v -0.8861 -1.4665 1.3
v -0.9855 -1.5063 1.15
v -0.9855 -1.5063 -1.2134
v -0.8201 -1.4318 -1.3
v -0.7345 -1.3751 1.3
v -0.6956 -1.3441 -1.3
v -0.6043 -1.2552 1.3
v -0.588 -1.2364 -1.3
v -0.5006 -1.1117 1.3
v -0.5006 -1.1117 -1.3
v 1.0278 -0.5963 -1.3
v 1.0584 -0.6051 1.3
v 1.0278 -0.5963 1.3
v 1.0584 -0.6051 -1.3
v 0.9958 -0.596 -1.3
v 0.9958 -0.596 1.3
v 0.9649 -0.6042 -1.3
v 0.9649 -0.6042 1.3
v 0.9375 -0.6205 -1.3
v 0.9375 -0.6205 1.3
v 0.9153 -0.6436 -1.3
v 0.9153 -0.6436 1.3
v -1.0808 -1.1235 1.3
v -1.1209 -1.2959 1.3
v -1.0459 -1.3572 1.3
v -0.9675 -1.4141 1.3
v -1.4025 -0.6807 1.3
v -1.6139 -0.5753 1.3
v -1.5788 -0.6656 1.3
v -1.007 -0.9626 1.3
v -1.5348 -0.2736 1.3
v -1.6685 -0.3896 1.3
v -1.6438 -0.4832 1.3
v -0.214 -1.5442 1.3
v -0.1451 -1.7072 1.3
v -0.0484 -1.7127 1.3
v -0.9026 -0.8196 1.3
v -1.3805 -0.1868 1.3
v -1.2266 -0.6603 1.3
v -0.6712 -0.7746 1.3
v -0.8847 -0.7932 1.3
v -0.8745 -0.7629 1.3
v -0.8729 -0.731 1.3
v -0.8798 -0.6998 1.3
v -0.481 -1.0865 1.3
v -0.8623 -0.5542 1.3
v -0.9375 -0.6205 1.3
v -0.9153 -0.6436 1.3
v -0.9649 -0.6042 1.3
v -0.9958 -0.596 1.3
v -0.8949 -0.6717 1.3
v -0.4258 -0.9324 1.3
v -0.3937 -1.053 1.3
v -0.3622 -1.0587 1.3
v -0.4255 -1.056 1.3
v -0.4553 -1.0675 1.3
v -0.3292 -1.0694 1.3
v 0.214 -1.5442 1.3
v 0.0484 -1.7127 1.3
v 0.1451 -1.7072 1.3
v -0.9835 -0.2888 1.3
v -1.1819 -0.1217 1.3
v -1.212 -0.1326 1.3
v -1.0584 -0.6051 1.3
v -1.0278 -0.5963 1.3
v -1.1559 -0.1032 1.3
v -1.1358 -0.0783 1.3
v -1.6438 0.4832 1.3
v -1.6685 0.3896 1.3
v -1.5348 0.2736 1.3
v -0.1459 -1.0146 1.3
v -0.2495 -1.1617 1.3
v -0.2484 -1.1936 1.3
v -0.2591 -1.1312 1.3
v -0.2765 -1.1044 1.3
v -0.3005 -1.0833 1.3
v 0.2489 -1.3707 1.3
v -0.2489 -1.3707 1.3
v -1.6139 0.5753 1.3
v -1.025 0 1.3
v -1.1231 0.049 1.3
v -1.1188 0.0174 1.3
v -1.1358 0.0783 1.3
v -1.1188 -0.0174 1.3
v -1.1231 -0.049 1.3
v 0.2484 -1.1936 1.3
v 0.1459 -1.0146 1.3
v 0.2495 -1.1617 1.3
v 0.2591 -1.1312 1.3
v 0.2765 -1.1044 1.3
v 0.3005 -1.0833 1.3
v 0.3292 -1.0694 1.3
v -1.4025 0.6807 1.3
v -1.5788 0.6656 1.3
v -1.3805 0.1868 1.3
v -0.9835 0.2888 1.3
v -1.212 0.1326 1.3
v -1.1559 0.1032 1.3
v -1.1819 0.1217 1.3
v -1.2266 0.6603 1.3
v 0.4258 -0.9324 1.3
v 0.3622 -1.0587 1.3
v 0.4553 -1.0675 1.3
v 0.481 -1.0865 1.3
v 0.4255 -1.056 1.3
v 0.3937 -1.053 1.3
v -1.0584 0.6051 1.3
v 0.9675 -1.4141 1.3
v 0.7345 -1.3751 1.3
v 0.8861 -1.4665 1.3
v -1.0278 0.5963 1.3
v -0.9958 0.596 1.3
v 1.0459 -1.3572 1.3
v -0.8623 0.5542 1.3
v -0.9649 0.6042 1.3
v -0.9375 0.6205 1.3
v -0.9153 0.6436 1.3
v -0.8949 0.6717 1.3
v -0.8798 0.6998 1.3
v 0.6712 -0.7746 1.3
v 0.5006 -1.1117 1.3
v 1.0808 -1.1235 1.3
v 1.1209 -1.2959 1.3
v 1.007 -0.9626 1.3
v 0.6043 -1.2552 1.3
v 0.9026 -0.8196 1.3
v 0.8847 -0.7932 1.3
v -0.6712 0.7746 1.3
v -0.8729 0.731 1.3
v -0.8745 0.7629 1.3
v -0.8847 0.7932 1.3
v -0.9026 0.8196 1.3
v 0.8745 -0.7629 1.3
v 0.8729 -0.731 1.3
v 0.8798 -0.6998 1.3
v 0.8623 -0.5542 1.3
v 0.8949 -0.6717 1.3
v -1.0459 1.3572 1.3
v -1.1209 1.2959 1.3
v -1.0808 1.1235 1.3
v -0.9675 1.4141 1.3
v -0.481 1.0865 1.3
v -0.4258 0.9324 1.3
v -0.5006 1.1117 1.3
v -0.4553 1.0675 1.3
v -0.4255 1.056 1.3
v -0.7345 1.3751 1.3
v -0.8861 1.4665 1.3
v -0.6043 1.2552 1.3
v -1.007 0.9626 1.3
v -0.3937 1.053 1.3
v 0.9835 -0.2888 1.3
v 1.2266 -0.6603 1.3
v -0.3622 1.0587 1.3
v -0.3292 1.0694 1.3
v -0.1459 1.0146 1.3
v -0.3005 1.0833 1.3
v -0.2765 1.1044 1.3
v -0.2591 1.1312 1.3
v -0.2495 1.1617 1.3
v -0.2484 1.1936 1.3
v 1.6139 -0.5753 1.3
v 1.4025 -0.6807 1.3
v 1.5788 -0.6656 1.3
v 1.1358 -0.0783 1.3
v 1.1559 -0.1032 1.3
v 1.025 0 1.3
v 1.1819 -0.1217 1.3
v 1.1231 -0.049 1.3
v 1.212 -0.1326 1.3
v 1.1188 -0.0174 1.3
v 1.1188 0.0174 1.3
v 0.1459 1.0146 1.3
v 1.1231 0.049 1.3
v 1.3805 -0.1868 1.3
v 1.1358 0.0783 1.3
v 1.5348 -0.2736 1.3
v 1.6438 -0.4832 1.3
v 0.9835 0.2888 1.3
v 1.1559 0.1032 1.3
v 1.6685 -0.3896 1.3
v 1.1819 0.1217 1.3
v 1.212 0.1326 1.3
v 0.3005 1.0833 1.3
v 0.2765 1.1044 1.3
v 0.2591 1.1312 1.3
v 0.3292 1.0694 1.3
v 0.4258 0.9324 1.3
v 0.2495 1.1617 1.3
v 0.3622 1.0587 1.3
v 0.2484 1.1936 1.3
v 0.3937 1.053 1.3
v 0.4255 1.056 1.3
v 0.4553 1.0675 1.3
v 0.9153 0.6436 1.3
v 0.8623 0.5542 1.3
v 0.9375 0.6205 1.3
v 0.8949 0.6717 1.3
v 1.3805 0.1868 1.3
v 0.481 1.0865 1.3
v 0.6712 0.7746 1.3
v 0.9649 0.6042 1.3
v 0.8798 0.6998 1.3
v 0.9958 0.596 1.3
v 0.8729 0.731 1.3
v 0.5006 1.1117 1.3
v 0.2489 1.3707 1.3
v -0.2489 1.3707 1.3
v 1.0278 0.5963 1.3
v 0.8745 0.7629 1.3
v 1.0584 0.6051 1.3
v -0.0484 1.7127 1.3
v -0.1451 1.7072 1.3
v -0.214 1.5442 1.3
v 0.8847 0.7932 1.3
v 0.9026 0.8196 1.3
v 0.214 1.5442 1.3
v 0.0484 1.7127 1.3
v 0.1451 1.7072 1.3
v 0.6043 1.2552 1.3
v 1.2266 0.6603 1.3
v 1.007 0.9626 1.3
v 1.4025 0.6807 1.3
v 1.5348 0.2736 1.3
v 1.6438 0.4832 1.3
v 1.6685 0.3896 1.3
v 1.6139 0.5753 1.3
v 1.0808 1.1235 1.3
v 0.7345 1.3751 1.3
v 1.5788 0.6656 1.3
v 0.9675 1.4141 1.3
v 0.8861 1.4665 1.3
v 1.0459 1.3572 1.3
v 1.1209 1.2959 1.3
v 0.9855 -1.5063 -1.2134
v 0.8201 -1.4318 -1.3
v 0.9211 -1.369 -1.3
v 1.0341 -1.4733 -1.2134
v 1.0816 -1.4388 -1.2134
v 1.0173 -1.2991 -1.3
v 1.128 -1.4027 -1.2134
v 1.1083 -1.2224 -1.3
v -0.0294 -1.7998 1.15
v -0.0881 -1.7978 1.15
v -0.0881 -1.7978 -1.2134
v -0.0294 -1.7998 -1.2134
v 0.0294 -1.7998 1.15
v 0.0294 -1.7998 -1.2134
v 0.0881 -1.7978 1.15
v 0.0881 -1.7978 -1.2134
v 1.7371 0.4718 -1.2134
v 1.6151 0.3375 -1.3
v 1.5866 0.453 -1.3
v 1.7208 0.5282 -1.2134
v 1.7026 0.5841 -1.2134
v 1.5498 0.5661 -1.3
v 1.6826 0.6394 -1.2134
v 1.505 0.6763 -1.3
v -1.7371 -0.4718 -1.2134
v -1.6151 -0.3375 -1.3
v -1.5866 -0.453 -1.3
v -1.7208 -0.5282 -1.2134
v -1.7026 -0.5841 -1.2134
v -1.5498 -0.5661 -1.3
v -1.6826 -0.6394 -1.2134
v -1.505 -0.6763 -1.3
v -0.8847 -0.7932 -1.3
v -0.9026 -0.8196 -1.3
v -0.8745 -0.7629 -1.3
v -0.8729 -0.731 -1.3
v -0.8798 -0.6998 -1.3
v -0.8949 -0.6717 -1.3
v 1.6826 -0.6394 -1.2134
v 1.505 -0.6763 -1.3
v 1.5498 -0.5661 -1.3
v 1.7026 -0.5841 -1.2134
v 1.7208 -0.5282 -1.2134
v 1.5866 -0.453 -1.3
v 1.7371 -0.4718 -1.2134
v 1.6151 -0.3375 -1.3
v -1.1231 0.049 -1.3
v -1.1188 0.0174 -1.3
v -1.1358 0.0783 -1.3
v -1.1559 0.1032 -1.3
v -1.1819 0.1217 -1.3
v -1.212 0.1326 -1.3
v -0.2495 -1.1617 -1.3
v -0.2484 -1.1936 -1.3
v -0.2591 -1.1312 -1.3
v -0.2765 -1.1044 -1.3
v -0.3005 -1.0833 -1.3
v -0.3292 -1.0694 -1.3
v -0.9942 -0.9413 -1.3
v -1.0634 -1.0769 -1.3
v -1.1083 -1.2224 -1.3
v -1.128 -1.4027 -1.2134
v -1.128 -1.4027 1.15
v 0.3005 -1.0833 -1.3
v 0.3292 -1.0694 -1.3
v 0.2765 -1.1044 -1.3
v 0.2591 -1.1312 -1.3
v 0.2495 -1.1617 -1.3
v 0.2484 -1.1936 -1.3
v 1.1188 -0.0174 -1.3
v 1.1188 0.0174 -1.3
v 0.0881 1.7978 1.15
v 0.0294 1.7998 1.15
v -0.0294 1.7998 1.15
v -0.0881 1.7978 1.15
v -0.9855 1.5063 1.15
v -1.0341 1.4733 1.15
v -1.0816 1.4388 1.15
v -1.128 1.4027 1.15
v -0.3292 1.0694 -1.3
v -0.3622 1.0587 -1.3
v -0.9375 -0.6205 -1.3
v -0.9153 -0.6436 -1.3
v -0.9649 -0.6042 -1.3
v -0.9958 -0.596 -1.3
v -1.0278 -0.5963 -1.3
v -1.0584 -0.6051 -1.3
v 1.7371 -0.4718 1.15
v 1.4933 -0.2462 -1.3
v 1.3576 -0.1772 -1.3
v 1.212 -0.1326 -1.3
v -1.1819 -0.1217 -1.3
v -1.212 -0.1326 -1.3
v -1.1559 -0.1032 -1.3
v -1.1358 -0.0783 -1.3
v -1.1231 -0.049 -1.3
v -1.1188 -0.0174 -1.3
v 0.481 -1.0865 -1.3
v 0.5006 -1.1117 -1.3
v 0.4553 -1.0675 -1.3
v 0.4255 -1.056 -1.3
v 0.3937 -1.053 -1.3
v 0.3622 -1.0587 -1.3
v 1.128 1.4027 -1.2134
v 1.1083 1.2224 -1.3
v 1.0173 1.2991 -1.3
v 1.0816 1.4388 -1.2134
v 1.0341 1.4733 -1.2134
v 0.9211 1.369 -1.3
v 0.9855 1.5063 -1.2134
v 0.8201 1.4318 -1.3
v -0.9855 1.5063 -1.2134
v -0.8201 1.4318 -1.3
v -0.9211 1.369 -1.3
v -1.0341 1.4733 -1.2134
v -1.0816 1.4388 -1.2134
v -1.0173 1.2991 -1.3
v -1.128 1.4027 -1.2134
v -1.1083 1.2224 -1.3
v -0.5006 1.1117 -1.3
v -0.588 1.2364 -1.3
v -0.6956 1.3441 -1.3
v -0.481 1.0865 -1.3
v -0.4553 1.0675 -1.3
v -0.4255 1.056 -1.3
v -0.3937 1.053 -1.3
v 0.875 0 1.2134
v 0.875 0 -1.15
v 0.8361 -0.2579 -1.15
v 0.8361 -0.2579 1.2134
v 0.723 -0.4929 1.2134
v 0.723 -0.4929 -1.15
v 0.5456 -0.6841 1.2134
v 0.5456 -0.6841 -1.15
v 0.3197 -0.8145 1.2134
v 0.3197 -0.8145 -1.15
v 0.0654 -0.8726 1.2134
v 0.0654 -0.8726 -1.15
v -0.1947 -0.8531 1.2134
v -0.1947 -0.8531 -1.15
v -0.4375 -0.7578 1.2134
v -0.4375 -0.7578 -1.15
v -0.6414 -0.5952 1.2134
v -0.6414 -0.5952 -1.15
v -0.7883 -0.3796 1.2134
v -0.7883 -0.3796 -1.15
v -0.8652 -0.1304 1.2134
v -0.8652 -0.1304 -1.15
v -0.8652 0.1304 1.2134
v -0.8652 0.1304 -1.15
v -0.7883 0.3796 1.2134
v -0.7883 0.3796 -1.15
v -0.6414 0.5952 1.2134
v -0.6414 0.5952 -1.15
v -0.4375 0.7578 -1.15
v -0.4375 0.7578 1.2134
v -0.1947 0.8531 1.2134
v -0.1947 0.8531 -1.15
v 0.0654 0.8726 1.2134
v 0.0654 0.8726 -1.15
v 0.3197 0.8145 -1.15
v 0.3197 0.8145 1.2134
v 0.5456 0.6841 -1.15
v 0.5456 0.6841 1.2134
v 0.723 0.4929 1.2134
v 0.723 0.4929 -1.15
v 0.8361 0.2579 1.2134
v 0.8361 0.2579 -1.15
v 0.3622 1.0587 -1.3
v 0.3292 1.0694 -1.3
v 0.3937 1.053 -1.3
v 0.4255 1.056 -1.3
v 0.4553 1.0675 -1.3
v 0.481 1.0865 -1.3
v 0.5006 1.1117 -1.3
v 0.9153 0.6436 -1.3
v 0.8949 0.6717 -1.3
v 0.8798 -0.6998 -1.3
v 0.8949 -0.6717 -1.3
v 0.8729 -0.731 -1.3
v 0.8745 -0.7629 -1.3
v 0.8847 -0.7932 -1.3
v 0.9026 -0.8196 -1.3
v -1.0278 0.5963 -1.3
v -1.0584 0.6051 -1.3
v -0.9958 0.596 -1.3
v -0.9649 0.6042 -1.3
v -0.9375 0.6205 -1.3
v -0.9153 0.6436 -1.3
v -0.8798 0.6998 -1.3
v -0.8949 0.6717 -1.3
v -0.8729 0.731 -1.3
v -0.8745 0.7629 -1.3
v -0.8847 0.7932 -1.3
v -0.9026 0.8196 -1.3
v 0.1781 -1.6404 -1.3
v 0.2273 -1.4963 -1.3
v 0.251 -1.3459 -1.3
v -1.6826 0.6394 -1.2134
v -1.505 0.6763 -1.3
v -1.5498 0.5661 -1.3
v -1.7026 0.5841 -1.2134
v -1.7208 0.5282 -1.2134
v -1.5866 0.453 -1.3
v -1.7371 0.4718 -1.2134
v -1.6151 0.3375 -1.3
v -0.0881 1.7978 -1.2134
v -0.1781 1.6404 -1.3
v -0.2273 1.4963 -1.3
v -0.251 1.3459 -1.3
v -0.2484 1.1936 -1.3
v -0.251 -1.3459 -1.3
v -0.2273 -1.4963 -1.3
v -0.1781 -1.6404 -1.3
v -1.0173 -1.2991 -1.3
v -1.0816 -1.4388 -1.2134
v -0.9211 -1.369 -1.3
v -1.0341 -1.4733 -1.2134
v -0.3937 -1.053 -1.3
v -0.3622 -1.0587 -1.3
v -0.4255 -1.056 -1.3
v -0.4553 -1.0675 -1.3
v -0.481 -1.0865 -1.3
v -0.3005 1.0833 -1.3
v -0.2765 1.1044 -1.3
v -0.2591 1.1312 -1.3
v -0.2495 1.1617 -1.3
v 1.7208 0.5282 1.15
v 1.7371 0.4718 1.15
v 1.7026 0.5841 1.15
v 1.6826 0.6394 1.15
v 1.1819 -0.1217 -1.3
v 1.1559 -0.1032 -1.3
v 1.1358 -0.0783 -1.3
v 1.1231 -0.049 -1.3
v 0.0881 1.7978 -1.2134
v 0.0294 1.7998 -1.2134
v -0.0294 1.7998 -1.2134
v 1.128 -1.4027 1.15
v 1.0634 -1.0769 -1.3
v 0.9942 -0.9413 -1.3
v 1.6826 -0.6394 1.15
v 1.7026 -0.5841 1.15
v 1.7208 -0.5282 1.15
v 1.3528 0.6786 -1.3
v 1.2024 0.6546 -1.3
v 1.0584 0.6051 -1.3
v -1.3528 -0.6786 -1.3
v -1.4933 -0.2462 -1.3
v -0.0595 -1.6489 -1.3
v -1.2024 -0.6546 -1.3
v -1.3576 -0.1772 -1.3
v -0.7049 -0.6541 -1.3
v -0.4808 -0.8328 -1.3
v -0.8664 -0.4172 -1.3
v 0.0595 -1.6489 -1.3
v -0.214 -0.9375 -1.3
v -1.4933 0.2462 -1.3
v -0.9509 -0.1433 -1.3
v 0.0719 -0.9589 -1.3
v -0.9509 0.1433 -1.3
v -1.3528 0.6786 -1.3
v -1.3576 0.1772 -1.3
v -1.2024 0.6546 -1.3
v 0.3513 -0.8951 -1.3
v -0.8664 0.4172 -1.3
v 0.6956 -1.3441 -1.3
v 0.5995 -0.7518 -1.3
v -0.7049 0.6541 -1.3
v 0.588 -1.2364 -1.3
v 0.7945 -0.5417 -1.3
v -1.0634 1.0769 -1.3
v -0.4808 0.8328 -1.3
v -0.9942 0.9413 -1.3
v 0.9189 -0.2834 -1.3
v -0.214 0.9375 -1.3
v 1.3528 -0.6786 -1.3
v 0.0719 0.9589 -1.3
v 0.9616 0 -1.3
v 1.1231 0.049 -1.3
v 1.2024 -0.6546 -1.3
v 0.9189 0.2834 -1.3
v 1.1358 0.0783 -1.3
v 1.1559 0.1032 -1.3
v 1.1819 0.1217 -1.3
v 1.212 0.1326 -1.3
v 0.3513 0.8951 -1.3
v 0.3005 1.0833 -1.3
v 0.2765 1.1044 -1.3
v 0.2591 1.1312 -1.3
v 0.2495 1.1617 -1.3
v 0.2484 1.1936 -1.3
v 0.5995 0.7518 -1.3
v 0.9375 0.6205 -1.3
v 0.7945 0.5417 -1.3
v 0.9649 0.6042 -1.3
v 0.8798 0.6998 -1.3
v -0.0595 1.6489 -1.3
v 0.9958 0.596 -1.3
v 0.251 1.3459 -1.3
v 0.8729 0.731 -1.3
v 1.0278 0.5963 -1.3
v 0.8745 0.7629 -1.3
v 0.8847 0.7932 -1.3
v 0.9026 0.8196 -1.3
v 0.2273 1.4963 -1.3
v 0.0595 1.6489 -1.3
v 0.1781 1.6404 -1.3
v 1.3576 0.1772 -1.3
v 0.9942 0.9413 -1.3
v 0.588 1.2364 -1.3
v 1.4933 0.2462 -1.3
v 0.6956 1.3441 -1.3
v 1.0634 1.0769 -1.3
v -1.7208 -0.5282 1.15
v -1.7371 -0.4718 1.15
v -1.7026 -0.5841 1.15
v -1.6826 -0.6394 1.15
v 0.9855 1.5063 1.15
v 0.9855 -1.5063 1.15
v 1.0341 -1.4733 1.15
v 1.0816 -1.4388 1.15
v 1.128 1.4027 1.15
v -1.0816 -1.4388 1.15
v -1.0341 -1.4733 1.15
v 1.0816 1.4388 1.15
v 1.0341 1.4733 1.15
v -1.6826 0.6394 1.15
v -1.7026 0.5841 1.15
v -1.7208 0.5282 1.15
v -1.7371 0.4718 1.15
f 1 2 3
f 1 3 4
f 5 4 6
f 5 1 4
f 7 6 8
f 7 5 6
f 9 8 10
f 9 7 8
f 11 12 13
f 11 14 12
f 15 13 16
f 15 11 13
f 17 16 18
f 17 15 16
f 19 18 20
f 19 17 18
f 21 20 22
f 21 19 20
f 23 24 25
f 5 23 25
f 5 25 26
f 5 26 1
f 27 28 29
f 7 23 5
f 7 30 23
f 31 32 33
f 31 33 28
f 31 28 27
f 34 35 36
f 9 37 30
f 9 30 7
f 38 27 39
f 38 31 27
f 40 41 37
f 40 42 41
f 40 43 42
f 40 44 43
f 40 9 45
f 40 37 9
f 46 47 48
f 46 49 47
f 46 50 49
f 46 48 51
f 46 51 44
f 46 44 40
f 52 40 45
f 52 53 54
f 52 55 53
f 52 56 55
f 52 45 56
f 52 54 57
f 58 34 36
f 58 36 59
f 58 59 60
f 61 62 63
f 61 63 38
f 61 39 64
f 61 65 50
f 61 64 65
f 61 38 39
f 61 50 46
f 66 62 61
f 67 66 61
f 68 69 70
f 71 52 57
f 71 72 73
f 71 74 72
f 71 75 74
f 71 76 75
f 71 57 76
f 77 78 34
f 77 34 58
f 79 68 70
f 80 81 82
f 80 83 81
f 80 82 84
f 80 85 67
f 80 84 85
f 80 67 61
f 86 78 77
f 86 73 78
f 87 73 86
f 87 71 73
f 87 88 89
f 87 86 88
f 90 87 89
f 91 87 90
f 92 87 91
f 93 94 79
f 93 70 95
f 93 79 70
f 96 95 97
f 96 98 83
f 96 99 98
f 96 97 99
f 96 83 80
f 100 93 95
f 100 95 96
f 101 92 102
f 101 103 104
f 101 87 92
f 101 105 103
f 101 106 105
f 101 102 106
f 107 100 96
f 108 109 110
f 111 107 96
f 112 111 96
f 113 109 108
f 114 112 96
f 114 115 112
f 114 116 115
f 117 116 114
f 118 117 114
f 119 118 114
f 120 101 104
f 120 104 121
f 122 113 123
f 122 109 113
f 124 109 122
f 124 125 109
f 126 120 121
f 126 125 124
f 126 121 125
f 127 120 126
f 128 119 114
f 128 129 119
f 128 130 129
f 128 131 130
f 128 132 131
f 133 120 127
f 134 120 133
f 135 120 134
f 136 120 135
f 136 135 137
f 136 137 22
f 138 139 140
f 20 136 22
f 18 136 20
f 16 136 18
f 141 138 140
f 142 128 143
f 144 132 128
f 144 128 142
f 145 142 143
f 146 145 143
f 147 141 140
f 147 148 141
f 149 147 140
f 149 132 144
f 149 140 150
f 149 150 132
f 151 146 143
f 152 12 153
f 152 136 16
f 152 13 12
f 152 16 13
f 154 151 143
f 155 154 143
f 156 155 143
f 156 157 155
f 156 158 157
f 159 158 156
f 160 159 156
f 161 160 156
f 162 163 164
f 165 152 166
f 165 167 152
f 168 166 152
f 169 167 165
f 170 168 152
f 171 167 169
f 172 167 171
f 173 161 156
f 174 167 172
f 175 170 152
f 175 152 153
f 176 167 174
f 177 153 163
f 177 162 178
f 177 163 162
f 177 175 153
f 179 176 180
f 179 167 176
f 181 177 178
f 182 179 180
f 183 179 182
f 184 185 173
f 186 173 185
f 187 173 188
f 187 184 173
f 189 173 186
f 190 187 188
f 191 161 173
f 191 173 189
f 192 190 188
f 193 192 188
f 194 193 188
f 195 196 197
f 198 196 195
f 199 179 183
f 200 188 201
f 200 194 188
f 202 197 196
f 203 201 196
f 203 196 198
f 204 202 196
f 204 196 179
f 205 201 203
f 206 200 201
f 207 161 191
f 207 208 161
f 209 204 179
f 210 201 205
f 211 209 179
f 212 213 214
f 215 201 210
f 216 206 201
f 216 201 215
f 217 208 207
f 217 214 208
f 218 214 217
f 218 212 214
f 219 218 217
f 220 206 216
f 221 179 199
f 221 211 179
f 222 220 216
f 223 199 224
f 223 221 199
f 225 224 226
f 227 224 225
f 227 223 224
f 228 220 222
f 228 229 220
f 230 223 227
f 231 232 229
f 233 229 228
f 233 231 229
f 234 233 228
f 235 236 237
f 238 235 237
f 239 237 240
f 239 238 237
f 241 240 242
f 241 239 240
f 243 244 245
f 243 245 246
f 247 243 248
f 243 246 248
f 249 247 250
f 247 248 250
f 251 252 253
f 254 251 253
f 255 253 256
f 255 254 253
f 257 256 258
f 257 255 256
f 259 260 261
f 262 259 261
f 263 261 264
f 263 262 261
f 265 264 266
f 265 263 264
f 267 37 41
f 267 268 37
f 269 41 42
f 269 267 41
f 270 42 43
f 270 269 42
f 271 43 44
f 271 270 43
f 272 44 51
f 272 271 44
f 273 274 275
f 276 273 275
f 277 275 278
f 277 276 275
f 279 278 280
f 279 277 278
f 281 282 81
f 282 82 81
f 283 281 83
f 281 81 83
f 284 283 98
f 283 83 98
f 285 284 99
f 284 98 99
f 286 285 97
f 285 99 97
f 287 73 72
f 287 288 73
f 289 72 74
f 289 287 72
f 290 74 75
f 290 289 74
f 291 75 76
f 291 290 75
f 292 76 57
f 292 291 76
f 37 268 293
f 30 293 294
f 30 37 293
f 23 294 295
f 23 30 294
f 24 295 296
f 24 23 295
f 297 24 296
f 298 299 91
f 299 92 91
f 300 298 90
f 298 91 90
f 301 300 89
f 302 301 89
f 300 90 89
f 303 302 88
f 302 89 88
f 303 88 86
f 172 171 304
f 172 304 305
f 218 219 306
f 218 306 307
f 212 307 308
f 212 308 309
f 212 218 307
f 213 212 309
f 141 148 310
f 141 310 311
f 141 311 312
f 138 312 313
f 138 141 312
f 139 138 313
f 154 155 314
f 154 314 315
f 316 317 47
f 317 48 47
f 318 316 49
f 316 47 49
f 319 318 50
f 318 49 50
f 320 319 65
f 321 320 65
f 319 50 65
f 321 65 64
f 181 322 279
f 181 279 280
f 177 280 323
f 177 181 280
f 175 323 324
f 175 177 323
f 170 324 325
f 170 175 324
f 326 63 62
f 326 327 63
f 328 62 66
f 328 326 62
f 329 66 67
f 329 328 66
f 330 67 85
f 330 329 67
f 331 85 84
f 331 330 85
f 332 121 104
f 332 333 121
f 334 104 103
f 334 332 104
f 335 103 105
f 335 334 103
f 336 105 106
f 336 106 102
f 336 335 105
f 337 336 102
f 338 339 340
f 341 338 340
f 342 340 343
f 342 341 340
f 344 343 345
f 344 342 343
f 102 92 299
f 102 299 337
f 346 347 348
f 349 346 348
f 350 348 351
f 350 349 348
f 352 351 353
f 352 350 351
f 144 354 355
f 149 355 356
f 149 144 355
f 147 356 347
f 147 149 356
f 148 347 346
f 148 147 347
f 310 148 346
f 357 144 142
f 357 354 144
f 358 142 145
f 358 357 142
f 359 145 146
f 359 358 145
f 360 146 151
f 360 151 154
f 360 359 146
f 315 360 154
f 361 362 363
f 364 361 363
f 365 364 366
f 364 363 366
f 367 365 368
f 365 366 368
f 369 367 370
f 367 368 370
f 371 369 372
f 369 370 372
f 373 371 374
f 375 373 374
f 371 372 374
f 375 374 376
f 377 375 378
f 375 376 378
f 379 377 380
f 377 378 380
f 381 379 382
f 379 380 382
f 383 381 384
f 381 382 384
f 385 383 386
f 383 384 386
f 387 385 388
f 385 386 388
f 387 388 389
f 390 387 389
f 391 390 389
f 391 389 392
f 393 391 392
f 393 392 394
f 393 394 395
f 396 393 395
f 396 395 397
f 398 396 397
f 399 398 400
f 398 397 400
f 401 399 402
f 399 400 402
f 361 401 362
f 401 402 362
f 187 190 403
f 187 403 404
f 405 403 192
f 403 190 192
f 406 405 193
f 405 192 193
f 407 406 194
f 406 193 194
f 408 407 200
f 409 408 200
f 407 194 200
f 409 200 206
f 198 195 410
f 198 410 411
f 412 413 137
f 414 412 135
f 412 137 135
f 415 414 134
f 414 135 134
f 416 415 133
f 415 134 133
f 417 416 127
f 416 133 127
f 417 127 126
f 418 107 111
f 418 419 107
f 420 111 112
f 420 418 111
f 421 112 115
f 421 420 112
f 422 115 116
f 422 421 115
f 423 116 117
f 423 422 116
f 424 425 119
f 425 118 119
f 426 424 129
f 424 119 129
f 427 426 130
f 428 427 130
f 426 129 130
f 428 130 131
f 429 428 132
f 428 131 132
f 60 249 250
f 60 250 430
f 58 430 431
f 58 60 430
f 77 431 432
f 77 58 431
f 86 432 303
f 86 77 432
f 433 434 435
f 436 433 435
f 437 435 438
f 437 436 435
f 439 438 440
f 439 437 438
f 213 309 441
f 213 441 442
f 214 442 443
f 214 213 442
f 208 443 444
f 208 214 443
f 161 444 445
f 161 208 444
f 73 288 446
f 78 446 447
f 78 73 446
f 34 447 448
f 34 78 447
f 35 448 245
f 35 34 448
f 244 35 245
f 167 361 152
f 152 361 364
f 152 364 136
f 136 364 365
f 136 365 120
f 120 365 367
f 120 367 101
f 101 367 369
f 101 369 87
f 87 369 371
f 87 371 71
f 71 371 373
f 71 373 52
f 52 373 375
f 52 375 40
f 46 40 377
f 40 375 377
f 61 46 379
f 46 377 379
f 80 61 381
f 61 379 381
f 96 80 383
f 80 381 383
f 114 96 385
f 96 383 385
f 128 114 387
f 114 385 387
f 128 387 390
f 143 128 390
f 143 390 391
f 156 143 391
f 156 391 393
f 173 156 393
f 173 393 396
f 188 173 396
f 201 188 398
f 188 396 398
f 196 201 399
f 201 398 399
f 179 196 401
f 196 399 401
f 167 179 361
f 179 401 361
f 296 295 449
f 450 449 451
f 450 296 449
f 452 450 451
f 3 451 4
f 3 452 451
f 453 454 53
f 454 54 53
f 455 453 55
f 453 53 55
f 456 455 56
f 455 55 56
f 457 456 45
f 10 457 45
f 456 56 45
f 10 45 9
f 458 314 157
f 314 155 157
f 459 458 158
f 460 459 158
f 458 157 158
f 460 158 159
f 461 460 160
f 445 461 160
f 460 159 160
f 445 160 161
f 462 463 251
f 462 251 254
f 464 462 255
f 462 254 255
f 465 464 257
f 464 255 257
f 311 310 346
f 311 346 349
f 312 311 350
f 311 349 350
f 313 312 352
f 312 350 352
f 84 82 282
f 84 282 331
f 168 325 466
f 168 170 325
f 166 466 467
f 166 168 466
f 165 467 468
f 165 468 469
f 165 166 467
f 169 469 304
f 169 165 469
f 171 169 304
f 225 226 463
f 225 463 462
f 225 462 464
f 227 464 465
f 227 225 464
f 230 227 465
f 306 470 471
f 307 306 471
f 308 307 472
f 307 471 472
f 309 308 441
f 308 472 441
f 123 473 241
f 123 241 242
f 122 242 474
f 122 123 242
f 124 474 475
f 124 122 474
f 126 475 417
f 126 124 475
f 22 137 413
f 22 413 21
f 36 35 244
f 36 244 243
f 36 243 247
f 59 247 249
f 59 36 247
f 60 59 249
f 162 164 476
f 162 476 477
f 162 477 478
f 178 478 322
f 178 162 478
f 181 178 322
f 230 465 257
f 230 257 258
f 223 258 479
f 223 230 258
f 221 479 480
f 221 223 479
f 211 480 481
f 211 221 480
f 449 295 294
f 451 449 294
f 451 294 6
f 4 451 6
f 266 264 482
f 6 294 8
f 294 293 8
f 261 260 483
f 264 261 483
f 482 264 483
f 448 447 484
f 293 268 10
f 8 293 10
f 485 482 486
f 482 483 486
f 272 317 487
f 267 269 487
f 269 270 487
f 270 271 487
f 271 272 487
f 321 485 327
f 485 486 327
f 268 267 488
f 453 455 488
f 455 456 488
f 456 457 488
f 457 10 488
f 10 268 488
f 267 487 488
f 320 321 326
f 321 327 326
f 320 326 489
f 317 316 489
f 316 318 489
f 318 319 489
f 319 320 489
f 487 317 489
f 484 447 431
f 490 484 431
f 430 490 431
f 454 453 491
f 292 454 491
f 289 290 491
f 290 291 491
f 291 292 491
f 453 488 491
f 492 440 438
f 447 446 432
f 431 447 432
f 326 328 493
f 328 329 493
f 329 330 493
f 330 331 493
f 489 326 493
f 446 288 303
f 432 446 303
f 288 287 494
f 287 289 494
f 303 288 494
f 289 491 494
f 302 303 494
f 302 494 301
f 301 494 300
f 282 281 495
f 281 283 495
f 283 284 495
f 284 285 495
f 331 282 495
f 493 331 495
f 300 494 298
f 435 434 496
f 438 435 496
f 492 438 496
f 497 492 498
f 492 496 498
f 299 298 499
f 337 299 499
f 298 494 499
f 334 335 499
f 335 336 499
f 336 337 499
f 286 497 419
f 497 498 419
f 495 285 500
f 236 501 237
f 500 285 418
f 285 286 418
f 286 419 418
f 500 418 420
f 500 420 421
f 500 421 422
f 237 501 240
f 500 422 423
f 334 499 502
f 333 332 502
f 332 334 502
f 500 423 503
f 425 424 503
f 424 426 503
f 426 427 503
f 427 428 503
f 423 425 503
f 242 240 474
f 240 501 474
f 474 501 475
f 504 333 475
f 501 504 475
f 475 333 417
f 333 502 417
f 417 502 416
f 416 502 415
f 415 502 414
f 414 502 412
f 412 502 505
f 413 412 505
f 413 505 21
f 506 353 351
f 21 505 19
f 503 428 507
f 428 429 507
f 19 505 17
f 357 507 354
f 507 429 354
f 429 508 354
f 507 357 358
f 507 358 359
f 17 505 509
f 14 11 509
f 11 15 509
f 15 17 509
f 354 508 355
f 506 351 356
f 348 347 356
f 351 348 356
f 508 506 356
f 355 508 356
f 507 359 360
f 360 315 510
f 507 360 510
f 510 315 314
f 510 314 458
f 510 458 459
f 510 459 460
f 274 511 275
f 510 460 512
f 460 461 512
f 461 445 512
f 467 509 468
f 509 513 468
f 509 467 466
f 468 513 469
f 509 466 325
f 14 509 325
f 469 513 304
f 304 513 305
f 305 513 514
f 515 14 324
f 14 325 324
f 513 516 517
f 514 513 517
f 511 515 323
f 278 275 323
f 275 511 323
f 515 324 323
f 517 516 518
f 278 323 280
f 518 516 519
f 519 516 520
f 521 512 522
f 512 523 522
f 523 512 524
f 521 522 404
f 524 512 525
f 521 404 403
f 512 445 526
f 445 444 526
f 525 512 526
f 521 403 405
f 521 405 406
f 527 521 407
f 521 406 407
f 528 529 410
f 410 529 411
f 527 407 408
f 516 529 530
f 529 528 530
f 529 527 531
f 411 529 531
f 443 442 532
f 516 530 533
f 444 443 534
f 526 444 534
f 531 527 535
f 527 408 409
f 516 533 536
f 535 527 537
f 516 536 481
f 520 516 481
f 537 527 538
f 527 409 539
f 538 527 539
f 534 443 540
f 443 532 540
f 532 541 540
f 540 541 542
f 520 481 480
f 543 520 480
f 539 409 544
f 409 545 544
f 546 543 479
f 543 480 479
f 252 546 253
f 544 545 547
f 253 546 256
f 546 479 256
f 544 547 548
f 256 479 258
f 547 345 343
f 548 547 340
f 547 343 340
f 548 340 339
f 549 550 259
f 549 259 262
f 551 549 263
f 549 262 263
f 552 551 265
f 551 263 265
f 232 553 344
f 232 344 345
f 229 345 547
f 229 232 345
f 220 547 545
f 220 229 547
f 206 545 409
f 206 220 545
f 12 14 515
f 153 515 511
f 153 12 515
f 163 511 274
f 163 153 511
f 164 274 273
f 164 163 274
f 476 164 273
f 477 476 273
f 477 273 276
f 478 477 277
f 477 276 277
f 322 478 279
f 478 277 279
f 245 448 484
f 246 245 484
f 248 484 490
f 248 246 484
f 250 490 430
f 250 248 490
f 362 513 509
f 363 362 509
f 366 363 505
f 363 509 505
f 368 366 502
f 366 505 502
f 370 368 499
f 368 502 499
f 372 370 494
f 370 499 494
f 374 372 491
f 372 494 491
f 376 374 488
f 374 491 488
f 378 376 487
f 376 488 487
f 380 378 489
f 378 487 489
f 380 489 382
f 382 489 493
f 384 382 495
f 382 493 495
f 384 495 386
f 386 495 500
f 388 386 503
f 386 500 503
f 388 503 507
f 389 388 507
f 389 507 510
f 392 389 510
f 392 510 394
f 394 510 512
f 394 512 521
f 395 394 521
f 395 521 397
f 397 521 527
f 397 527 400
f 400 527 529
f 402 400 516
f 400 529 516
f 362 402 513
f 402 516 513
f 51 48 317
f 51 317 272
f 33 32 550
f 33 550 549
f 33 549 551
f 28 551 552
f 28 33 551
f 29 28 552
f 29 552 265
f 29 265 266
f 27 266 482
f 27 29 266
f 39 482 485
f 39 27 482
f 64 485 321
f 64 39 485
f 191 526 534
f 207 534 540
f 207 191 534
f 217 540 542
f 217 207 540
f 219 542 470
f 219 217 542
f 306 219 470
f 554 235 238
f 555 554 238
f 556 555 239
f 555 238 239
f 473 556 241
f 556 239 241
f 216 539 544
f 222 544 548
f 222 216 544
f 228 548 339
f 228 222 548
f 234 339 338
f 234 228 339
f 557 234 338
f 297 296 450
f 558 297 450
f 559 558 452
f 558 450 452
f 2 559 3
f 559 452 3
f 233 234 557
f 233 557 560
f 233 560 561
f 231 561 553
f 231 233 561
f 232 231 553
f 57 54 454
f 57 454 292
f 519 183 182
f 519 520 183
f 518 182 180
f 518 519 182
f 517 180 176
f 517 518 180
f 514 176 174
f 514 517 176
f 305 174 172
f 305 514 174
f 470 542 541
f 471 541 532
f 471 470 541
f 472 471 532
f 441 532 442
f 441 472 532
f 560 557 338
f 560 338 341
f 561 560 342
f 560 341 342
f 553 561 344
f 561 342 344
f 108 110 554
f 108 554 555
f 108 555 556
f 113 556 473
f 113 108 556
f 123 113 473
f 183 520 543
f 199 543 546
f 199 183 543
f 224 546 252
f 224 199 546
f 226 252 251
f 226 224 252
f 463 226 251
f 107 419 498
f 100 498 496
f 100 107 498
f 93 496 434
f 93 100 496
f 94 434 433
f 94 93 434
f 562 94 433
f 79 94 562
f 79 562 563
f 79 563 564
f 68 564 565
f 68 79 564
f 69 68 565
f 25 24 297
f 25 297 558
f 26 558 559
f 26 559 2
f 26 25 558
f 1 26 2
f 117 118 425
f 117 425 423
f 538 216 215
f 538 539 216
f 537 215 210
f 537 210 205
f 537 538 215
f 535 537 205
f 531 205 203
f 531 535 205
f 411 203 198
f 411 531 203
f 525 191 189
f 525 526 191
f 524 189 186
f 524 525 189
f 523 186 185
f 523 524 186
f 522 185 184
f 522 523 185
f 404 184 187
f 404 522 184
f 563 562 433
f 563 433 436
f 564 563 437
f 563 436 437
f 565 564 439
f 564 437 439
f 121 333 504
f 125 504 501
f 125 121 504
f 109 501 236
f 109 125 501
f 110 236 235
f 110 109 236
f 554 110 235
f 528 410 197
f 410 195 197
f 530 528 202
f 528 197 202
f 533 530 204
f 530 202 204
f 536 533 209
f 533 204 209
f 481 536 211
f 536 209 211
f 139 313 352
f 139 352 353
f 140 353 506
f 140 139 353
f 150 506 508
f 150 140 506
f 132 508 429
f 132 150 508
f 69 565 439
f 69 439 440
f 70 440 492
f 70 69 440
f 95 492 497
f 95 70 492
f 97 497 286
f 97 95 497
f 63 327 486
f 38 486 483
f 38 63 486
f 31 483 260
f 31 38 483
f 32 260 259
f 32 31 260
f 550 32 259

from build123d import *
from OCP.BRepFilletAPI import BRepFilletAPI_MakeChamfer

# Parameters (mm, degrees)
BOSS_EXTRUDE1_DEPTH      = 1.3
BOSS_EXTRUDE1_DEPTH_BACK = 1.3
SKETCH3_R                = 1.8
SKETCH5_W                = 2.6
SKETCH5_H                = 0.875
CHAMFER1_SIZE            = 0.15
CHAMFER1_SIZE2           = 0.08660254
CUT_EXTRUDE1_DEPTH       = 3.858321186
FILLET1_R                = 0.117809725
CIRPATTERN1_COUNT        = 10
FILLET1_OF_CIRPATTERN1_R = 0.117809725


with BuildPart() as part:
    # Sketch3 → Boss-Extrude1 (new, two sides: drawn at the far end of the back side and taken through both)
    with BuildSketch(Plane.XY.offset(-BOSS_EXTRUDE1_DEPTH_BACK)):
        Circle(SKETCH3_R)
    extrude(amount=BOSS_EXTRUDE1_DEPTH + BOSS_EXTRUDE1_DEPTH_BACK)

    # Sketch5 → Cut-Revolve1 (revolve, cut)
    with BuildSketch(Plane(origin=(0, 0, 0), x_dir=(0, 0, -1), z_dir=(1, 0, 0)), mode=Mode.PRIVATE) as cut_revolve1_sk:
        with Locations((0, 0.4375)):
            Rectangle(SKETCH5_W, SKETCH5_H)
    revolve(cut_revolve1_sk.sketch.rotate(Axis((0, 0, 5.997700685), (0, 0, -1)), 90), axis=Axis((0, 0, 5.997700685), (0, 0, -1)), mode=Mode.SUBTRACT)

    # Chamfer1: one chamfer whose edges measure the first distance from different faces: ONE call of the kernel's chamfer builder (chamfer() names one face for all edges)
    chamfer1_edges_1 = [part.edges().sort_by_distance(p)[0] for p in [
        (-1.8, 0, -1.3),
    ]]
    chamfer1_side_1 = [part.faces().sort_by_distance(p)[0] for p in [
        (-1.749088312, 0, -1.3),
    ]]
    chamfer1_edges_2 = [part.edges().sort_by_distance(p)[0] for p in [
        (-1.8, 0, 1.3),
    ]]
    chamfer1_side_2 = [part.faces().sort_by_distance(p)[0] for p in [
        (-1.8, 0, 0.65),
    ]]
    chamfer1_edges_3 = [part.edges().sort_by_distance(p)[0] for p in [
        (-0.875, 0, 1.3),
    ]]
    chamfer1_side_3 = [part.faces().sort_by_distance(p)[0] for p in [
        (-1.749088312, 0, 1.3),
    ]]
    chamfer1_edges_4 = [part.edges().sort_by_distance(p)[0] for p in [
        (-0.875, 0, -1.3),
    ]]
    chamfer1_side_4 = [part.faces().sort_by_distance(p)[0] for p in [
        (-0.875, 0, 0),
    ]]
    chamfer1 = BRepFilletAPI_MakeChamfer(part.part.solid().wrapped)
    for e in chamfer1_edges_1:
        chamfer1.Add(CHAMFER1_SIZE, CHAMFER1_SIZE2, e.wrapped, chamfer1_side_1[0].wrapped)  # the first distance lies on this face
    for e in chamfer1_edges_2:
        chamfer1.Add(CHAMFER1_SIZE, CHAMFER1_SIZE2, e.wrapped, chamfer1_side_2[0].wrapped)  # the first distance lies on this face
    for e in chamfer1_edges_3:
        chamfer1.Add(CHAMFER1_SIZE, CHAMFER1_SIZE2, e.wrapped, chamfer1_side_3[0].wrapped)  # the first distance lies on this face
    for e in chamfer1_edges_4:
        chamfer1.Add(CHAMFER1_SIZE, CHAMFER1_SIZE2, e.wrapped, chamfer1_side_4[0].wrapped)  # the first distance lies on this face
    add(Compound.cast(chamfer1.Shape()), mode=Mode.REPLACE)

    # Sketch4 → Cut-Extrude1 (cut, symmetric)
    with BuildSketch(Plane.XY):
        with BuildLine():
            Line((1.118814493, -0.117809725), (1.118814493, 0.117809725))
            ThreePointArc((1.118814493, 0.117809725), (1.465338676, 0.229467686), (1.737080105, 0.471754923))
            ThreePointArc((1.737080105, 0.471754923), (1.8, 0), (1.737080105, -0.471754923))
            ThreePointArc((1.737080105, -0.471754923), (1.465338676, -0.229467686), (1.118814493, -0.117809725))
        make_face()
    cut_extrude1 = extrude(amount=CUT_EXTRUDE1_DEPTH, both=True, mode=Mode.SUBTRACT)

    # Fillet1
    fillet1_edges = [part.edges().sort_by_distance(p)[0] for p in [
        (1.118814493, 0.117809725, 0),
        (1.118814493, -0.117809725, 0),
    ]]
    fillet(fillet1_edges, radius=FILLET1_R)

    # CirPattern1: Cut-Extrude1 ×10 about axis
    cirpattern1_axis = Axis((0, 0, 0), (0, 0, 1))
    for i in range(1, CIRPATTERN1_COUNT):
        add(cut_extrude1.rotate(cirpattern1_axis, i * 360 / CIRPATTERN1_COUNT), mode=Mode.SUBTRACT)

    # Fillet1 of CirPattern1
    fillet1_of_cirpattern1_edges = [part.edges().sort_by_distance(p)[0] for p in [
        (0.835893119, 0.752932728, 0),
        (0.974386757, 0.56231259, 0),
        (0.233688986, 1.100461021, 0),
        (0.457776398, 1.027650607, 0),
        (-0.457776398, 1.027650607, 0),
        (-0.233688986, 1.100461021, 0),
        (-0.974386757, 0.56231259, 0),
        (-0.835893119, 0.752932728, 0),
        (-1.118814493, -0.117809725, 0),
        (-1.118814493, 0.117809725, 0),
        (-0.835893119, -0.752932728, 0),
        (-0.974386757, -0.56231259, 0),
        (-0.233688986, -1.100461021, 0),
        (-0.457776398, -1.027650607, 0),
        (0.457776398, -1.027650607, 0),
        (0.233688986, -1.100461021, 0),
        (0.974386757, -0.56231259, 0),
        (0.835893119, -0.752932728, 0),
    ]]
    fillet(fillet1_of_cirpattern1_edges, radius=FILLET1_OF_CIRPATTERN1_R)


solid = part.part
